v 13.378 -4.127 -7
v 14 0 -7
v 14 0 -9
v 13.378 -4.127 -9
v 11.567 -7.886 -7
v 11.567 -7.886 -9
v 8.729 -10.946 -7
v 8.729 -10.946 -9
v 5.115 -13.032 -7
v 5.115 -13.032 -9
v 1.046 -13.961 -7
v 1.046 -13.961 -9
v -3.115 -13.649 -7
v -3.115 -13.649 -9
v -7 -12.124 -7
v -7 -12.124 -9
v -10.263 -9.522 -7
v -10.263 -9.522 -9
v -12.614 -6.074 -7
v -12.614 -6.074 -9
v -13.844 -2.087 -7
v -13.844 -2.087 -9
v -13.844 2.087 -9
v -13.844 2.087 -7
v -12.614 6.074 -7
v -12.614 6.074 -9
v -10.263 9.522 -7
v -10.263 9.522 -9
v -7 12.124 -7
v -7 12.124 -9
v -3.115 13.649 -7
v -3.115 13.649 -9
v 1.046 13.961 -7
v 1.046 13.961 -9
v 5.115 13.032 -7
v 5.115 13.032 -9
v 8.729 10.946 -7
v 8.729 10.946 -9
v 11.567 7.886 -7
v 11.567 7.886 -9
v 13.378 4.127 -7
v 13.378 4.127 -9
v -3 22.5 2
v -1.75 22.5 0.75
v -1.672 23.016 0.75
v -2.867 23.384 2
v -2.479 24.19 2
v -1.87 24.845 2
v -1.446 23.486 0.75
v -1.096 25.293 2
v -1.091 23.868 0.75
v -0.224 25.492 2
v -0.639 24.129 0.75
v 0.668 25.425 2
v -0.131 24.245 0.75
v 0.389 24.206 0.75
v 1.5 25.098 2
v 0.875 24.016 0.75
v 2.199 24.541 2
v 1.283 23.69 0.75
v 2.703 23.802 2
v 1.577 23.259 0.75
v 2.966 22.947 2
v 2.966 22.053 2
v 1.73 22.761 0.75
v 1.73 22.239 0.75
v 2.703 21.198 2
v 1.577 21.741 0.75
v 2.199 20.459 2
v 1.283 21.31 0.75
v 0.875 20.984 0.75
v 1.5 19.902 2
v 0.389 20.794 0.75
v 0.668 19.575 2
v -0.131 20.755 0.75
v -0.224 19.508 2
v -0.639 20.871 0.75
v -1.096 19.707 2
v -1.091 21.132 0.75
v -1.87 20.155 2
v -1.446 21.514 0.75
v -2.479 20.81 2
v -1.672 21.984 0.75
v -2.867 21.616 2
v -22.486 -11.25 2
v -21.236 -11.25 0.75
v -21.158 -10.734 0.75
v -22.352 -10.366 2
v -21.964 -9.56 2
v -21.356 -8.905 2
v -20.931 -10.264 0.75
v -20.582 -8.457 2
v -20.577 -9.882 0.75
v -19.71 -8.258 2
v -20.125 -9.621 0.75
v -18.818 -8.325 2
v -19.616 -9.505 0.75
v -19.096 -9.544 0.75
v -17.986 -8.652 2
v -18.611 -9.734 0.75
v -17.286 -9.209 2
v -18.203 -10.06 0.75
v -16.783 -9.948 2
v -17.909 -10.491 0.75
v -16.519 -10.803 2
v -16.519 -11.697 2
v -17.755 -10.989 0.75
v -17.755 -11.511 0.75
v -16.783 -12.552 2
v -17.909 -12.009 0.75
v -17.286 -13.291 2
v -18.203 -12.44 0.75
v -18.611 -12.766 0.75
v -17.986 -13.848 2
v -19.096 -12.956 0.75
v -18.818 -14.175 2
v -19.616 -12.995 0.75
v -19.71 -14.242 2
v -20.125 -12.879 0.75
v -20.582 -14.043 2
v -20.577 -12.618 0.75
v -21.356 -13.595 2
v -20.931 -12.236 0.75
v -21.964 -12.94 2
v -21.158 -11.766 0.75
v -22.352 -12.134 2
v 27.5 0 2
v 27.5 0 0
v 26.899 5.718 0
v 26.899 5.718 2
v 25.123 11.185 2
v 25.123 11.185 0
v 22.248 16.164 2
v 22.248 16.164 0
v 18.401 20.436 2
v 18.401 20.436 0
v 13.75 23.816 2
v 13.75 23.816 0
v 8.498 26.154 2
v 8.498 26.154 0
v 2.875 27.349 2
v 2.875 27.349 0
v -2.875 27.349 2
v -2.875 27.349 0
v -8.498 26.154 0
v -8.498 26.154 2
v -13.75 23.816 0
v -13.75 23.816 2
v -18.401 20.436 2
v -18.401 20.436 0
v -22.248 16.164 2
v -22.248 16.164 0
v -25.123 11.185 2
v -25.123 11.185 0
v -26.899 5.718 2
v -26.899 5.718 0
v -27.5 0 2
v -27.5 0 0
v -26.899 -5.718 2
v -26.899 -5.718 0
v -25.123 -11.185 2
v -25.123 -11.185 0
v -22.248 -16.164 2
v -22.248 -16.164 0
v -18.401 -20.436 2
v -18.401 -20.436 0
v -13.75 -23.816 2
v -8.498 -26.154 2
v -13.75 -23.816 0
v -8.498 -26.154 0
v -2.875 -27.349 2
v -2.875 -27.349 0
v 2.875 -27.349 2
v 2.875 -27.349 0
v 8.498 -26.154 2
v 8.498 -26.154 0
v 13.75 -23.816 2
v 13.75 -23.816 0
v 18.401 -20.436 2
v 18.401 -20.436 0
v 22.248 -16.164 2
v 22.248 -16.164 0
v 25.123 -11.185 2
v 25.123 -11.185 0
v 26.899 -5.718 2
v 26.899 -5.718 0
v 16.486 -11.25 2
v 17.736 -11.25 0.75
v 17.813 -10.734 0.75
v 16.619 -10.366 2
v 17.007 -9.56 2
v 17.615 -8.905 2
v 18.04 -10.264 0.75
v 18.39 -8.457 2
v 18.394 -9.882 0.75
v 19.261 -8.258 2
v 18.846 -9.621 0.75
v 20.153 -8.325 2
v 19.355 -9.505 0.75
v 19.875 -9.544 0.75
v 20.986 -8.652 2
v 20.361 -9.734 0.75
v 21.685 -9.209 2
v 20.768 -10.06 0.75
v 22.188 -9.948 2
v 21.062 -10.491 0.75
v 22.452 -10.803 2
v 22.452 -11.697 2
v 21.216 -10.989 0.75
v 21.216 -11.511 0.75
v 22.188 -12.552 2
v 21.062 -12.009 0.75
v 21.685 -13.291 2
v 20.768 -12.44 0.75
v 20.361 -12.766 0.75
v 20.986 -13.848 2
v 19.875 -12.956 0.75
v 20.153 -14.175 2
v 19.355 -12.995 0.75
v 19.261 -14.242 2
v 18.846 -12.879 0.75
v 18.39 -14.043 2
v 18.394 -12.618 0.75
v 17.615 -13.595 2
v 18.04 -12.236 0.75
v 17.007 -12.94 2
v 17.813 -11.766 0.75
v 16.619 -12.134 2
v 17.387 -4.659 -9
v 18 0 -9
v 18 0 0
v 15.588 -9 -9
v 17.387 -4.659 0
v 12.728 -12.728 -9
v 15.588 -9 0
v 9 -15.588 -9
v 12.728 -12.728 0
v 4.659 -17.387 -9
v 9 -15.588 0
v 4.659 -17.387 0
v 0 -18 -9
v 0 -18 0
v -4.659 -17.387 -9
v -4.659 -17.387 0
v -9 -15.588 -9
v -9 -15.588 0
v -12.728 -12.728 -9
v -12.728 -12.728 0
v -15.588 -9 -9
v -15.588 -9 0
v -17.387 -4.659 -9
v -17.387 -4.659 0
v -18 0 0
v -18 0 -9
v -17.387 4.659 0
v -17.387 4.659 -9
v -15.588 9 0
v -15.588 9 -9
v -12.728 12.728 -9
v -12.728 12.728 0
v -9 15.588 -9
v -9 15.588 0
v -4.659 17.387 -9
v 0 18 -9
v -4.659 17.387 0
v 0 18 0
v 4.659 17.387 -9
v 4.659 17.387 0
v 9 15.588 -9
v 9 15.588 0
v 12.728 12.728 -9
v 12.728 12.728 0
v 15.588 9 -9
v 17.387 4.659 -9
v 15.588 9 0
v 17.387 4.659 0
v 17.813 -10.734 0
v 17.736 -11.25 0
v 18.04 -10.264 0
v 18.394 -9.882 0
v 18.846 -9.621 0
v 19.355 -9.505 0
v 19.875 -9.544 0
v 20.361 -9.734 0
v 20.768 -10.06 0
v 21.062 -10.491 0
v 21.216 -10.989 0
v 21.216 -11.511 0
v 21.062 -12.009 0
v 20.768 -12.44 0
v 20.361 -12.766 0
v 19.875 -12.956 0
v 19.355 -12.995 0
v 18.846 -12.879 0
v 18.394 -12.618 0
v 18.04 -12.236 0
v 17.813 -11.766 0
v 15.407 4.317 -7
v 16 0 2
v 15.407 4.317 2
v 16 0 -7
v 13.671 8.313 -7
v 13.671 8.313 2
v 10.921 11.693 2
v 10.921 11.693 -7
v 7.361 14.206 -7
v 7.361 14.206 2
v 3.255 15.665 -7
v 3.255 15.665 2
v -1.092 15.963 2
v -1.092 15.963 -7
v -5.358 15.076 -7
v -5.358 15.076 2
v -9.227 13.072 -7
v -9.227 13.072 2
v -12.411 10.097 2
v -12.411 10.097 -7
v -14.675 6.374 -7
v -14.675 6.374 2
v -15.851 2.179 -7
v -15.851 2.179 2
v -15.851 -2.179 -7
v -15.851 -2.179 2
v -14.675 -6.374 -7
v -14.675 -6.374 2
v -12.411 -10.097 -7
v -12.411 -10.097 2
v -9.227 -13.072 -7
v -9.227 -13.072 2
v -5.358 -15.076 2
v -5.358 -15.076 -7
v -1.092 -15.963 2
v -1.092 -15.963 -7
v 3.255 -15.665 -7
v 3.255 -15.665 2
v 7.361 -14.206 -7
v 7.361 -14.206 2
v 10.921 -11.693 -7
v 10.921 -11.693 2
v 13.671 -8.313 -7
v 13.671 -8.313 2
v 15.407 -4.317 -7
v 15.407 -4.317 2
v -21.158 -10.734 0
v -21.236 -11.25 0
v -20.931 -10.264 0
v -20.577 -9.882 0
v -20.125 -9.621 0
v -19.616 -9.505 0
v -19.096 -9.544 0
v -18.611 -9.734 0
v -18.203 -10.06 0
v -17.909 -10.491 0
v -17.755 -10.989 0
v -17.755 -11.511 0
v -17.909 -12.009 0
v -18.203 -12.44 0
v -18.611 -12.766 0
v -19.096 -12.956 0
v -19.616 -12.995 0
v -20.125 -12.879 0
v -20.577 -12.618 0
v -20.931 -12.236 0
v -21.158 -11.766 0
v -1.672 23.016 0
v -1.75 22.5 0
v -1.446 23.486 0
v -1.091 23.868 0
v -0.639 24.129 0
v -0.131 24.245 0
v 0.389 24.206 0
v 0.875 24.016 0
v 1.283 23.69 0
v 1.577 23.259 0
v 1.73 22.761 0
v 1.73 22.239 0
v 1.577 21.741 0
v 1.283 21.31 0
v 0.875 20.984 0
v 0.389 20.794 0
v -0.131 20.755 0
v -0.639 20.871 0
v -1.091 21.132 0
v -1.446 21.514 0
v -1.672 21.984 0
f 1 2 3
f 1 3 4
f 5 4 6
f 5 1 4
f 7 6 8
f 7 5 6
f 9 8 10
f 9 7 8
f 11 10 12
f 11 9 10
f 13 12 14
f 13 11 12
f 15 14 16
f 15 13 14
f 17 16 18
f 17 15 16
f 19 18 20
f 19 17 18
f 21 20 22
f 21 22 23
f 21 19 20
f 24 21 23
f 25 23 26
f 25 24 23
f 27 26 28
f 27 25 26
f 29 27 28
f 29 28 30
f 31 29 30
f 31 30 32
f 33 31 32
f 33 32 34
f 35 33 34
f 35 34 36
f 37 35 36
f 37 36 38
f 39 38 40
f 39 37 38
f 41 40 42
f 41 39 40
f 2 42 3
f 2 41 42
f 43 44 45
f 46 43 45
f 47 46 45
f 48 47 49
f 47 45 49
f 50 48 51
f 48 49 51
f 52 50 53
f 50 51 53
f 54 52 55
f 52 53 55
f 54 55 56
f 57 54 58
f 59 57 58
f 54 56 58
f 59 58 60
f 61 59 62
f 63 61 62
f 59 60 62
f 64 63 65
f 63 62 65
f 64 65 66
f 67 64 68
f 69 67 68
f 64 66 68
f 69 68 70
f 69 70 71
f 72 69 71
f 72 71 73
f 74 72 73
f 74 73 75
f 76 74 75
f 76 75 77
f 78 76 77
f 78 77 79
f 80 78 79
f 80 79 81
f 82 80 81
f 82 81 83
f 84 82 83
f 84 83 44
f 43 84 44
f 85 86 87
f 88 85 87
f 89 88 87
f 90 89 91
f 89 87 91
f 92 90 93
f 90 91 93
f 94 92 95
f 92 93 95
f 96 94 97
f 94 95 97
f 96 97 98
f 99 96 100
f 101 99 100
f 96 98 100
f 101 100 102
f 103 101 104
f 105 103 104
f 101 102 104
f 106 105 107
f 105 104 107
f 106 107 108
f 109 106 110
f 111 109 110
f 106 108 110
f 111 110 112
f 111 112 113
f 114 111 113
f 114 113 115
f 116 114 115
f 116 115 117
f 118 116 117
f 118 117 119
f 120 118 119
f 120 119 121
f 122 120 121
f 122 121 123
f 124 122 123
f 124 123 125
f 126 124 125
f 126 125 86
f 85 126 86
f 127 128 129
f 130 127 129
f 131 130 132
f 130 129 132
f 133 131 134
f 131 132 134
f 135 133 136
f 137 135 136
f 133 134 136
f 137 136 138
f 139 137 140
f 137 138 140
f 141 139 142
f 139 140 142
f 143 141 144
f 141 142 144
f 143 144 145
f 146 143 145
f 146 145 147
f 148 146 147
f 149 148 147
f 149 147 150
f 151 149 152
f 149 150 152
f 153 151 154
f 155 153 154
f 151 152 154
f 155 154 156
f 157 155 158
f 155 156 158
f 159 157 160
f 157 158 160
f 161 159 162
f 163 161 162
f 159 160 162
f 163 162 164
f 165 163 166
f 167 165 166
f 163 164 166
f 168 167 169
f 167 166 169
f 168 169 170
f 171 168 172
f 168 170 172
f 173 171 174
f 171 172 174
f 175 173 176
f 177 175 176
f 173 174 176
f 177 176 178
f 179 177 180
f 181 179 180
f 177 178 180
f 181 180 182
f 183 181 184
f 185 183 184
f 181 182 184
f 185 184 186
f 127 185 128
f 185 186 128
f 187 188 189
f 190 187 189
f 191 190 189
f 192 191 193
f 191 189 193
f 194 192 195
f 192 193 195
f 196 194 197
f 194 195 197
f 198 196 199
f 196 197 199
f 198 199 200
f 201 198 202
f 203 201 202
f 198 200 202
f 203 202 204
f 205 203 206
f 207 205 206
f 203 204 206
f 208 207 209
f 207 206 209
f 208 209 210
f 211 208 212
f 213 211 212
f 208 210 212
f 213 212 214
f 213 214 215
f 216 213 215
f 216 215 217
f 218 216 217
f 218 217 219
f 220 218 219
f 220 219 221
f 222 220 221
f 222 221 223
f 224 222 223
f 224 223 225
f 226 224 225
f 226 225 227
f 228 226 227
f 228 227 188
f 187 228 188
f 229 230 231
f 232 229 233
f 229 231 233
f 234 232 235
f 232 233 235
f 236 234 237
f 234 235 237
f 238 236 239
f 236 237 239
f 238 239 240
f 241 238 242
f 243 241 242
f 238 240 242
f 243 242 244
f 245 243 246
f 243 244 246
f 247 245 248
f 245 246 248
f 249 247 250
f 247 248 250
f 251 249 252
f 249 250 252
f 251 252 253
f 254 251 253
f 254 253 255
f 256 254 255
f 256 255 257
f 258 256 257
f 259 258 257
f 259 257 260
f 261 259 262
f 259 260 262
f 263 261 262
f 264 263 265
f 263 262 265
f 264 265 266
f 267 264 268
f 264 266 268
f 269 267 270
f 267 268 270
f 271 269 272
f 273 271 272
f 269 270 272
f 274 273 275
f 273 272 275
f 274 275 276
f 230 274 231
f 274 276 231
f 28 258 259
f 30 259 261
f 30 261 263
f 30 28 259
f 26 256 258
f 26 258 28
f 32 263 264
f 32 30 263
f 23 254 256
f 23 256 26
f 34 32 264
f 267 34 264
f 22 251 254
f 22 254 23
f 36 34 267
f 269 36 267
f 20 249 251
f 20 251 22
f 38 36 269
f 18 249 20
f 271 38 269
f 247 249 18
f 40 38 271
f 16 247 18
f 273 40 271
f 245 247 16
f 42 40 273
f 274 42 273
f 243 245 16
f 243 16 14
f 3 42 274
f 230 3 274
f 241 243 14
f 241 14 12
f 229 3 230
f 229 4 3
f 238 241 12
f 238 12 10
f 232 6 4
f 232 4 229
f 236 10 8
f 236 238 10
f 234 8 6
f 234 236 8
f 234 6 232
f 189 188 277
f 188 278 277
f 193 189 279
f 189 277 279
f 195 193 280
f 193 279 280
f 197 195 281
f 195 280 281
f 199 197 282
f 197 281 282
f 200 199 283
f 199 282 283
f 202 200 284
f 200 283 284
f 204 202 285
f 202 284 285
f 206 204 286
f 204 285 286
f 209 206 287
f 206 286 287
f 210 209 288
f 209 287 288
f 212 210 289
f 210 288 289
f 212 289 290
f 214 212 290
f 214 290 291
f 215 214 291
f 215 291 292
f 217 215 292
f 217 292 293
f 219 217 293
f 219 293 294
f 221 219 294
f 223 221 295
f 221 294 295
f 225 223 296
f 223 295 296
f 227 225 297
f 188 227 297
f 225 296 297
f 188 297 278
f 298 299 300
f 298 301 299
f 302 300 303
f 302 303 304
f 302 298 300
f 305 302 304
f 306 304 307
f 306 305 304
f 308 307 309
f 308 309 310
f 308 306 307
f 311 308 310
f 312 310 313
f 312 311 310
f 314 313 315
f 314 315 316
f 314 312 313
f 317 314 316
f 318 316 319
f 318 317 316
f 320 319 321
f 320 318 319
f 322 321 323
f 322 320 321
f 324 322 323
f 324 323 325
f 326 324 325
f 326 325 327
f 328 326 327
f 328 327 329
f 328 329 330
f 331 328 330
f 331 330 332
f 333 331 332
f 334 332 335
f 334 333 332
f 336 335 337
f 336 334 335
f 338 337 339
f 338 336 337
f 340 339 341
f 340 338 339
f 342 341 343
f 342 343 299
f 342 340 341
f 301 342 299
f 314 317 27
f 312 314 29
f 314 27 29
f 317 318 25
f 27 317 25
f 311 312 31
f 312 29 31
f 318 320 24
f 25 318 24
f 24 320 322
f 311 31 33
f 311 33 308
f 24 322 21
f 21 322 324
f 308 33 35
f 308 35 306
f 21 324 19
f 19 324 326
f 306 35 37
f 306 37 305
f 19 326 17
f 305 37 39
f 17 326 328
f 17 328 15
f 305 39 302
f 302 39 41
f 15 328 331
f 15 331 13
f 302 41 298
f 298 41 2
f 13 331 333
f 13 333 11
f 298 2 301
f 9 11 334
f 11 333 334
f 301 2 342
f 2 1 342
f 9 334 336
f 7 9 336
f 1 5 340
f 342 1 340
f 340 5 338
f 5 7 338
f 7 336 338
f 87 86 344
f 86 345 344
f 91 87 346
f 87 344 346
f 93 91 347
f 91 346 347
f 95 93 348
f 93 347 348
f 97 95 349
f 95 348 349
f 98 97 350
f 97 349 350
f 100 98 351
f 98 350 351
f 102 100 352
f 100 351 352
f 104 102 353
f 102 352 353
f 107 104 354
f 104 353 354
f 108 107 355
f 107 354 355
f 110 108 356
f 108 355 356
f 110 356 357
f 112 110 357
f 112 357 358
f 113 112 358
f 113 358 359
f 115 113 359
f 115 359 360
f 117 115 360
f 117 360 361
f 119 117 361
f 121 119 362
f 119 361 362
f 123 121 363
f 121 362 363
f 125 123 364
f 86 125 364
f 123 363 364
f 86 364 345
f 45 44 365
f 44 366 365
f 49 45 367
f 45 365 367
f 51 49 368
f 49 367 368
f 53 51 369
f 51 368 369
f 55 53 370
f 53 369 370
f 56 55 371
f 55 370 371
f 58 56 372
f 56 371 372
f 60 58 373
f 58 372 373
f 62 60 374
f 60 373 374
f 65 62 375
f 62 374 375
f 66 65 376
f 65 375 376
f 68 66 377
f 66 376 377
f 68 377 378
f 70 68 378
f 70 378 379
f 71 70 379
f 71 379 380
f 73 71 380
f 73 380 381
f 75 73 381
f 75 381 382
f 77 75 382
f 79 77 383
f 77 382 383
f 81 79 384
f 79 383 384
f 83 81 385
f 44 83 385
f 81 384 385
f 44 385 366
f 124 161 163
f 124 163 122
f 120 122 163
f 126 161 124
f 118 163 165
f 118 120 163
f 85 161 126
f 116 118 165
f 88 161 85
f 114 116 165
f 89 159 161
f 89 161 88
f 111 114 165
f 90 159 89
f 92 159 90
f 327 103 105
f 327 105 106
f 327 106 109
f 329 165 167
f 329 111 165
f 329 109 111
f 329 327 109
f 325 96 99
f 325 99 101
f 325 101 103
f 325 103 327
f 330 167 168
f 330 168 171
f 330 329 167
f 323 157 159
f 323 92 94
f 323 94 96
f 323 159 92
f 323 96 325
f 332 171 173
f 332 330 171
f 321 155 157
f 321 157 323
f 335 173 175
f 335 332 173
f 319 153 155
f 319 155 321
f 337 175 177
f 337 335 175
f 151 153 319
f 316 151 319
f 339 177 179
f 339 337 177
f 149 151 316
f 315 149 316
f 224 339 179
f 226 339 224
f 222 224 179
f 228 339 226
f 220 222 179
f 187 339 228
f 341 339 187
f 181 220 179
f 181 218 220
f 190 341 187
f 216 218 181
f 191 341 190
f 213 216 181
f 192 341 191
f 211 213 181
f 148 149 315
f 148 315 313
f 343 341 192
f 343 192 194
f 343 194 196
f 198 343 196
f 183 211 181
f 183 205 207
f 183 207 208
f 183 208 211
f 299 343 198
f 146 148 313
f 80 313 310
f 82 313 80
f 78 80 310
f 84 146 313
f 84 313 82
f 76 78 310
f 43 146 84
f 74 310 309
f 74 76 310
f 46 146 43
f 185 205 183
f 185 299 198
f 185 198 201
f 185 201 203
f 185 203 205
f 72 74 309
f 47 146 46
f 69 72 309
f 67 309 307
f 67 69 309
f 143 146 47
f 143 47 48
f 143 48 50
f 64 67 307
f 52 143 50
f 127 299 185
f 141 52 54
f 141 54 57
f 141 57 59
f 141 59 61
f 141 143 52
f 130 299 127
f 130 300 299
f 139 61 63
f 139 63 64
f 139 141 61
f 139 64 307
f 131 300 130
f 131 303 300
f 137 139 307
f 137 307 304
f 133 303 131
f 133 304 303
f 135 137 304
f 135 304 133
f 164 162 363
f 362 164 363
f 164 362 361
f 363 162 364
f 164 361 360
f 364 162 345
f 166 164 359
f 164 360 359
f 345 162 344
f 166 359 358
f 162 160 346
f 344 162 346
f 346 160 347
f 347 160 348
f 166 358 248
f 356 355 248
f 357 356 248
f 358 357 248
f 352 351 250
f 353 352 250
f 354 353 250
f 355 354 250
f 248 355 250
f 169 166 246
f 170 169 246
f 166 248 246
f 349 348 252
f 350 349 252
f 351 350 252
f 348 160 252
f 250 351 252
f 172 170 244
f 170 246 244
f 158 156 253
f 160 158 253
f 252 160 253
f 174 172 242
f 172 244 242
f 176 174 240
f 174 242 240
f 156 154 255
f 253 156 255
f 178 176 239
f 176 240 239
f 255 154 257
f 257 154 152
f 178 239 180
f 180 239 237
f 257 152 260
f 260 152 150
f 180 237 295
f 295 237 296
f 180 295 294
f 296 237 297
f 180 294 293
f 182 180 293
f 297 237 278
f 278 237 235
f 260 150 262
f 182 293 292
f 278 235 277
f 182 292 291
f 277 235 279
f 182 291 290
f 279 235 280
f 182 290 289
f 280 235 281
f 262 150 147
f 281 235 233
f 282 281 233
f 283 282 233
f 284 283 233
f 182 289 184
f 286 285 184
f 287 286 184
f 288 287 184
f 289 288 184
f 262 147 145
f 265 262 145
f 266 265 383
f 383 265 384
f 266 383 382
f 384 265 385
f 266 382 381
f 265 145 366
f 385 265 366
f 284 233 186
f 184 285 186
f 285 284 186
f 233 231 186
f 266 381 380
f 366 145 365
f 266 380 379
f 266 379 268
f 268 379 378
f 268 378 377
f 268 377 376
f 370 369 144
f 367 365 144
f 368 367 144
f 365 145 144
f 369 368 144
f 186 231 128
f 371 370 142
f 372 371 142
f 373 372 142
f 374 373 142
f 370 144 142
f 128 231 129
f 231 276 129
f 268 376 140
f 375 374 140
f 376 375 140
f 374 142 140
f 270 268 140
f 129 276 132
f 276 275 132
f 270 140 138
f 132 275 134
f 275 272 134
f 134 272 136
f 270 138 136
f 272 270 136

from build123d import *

# Parameters (mm, degrees)
F0_R           = 18
F0_R_2         = 16
F1_DEPTH       = 7
F2_R           = 27.5
F2_R_2         = 16
F3_DEPTH       = 2
F4_R           = 18
F4_R_2         = 14
F5_DEPTH       = 2
F7_D           = 3.5
F7_CSINK_D     = 6
F7_CSINK_ANGLE = 90


with BuildPart() as f1:
    # F0 (on Top) → F1 (new body)
    with BuildSketch(Plane.XY):
        Circle(F0_R)
        Circle(F0_R_2, mode=Mode.SUBTRACT)
    extrude(amount=-F1_DEPTH)

    # F2 (on Top) → F3 (join)
    with BuildSketch(Plane.XY):
        Circle(F2_R)
        Circle(F2_R_2, mode=Mode.SUBTRACT)
    extrude(amount=F3_DEPTH)

    # F4 (on face) → F5 (join)
    with BuildSketch(Plane(origin=(0, 0, -7), x_dir=(1, 0, 0), z_dir=(0, 0, -1))):
        Circle(F4_R)
        Circle(F4_R_2, mode=Mode.SUBTRACT)
    extrude(amount=F5_DEPTH)

    # F7 (through all)
    with Locations(Plane.XY.offset(2)):
        with Locations((0, 22.5), (-19.485572, -11.25), (19.485572, -11.25)):
            CounterSinkHole(F7_D / 2, F7_CSINK_D / 2, counter_sink_angle=F7_CSINK_ANGLE)


solid = f1.part
